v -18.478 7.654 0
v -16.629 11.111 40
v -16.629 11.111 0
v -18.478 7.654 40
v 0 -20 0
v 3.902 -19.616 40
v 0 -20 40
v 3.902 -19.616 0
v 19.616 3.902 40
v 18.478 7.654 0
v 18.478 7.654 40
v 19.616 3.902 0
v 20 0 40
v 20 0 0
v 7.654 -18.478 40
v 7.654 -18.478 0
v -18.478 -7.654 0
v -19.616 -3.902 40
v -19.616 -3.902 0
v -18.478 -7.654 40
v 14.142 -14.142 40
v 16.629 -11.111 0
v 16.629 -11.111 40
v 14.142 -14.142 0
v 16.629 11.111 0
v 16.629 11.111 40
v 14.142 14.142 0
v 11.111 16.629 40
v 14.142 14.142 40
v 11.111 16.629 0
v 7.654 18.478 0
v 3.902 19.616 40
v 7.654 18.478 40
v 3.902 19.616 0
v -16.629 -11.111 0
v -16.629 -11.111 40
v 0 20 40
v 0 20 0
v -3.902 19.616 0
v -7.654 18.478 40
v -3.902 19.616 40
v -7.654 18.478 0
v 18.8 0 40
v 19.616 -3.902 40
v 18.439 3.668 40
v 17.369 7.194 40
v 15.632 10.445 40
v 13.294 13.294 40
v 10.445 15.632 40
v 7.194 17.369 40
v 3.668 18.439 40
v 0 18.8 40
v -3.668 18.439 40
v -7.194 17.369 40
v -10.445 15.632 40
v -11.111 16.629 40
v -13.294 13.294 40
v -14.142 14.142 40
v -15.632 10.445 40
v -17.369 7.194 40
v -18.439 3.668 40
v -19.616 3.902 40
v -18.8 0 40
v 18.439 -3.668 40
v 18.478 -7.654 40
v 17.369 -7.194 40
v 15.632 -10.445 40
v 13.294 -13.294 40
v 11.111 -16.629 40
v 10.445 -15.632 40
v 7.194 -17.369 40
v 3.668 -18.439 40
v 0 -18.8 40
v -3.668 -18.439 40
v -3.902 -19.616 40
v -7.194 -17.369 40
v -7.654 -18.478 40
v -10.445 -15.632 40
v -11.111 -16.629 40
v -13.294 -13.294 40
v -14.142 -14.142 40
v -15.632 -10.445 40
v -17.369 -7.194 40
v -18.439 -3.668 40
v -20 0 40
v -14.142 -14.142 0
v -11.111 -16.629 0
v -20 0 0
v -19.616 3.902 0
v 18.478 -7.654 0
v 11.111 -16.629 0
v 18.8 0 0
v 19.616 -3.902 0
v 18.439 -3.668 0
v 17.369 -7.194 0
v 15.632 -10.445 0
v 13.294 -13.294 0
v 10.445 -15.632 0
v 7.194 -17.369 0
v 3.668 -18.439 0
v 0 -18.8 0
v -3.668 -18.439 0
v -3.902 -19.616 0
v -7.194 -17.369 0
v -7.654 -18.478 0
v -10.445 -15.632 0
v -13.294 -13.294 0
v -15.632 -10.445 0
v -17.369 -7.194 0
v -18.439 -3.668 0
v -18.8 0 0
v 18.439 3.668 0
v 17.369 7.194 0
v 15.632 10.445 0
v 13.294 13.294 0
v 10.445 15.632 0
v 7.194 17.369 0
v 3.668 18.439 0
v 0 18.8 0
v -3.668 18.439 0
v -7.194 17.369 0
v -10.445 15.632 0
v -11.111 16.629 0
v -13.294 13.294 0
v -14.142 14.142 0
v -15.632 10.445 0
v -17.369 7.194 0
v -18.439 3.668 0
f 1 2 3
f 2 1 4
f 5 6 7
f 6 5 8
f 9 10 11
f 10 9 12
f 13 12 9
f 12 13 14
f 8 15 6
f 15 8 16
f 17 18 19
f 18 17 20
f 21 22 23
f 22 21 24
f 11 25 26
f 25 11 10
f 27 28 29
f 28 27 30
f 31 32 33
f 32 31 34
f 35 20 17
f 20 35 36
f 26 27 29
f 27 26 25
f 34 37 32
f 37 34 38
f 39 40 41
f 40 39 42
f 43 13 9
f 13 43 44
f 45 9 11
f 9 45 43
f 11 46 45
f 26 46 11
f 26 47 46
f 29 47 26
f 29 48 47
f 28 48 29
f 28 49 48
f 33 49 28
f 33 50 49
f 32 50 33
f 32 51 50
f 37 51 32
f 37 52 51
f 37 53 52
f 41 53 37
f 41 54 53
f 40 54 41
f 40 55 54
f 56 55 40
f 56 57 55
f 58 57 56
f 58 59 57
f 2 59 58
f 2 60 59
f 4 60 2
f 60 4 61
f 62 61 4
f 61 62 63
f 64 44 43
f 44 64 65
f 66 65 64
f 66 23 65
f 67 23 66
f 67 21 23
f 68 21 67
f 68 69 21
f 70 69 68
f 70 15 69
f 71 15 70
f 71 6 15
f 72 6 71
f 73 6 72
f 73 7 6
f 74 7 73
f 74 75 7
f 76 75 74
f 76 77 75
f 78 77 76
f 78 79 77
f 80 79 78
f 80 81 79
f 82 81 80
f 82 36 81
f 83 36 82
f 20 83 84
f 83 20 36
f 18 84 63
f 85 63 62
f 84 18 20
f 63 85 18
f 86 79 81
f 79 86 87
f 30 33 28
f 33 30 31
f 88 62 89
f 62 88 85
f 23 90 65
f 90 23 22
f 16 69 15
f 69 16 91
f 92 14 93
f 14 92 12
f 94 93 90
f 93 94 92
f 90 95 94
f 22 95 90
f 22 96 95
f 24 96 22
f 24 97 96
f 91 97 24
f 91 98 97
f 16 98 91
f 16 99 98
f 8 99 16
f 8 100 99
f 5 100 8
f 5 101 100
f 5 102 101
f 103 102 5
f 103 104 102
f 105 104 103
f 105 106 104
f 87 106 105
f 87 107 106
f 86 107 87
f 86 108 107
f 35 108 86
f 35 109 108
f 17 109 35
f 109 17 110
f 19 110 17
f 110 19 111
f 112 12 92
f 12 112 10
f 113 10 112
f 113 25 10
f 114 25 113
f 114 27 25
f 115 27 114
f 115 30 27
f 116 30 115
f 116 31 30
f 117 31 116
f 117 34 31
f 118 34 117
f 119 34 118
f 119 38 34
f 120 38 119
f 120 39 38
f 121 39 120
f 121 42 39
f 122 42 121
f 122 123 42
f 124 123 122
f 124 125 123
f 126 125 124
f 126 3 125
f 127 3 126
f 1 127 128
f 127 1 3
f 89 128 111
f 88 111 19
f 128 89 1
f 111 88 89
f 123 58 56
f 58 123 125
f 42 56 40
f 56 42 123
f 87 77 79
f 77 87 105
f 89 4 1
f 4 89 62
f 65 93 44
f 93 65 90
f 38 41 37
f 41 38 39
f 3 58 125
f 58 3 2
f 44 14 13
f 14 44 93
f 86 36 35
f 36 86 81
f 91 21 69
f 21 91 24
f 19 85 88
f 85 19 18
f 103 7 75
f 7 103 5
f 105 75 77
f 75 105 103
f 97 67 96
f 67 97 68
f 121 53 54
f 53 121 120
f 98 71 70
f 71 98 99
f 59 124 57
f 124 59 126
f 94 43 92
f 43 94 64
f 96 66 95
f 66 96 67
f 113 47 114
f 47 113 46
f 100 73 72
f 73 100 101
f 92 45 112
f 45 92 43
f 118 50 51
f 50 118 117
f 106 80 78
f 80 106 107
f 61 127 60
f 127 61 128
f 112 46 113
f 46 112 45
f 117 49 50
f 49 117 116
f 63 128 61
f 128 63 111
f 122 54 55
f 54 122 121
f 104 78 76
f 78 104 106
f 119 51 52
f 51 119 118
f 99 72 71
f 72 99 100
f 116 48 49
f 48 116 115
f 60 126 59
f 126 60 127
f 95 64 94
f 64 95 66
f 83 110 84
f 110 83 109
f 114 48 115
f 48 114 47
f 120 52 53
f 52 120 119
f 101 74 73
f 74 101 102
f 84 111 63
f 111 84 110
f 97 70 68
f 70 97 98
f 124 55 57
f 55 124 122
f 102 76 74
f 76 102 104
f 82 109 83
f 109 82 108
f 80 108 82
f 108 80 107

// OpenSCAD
$fn = 32;

// ----------------------------------------------------------------------
// Thin tube: 1.2 mm wall
// ----------------------------------------------------------------------

// --- parameters (mm) ---
tube_od = 40;             // outer diameter
tube_h = 40;              // height, Z
wall = 1.2;               // wall thickness

difference() {
  cylinder(h = tube_h, d = tube_od);
  translate([0, 0, -1]) cylinder(h = tube_h + 2, d = tube_od - 2 * wall);
}
